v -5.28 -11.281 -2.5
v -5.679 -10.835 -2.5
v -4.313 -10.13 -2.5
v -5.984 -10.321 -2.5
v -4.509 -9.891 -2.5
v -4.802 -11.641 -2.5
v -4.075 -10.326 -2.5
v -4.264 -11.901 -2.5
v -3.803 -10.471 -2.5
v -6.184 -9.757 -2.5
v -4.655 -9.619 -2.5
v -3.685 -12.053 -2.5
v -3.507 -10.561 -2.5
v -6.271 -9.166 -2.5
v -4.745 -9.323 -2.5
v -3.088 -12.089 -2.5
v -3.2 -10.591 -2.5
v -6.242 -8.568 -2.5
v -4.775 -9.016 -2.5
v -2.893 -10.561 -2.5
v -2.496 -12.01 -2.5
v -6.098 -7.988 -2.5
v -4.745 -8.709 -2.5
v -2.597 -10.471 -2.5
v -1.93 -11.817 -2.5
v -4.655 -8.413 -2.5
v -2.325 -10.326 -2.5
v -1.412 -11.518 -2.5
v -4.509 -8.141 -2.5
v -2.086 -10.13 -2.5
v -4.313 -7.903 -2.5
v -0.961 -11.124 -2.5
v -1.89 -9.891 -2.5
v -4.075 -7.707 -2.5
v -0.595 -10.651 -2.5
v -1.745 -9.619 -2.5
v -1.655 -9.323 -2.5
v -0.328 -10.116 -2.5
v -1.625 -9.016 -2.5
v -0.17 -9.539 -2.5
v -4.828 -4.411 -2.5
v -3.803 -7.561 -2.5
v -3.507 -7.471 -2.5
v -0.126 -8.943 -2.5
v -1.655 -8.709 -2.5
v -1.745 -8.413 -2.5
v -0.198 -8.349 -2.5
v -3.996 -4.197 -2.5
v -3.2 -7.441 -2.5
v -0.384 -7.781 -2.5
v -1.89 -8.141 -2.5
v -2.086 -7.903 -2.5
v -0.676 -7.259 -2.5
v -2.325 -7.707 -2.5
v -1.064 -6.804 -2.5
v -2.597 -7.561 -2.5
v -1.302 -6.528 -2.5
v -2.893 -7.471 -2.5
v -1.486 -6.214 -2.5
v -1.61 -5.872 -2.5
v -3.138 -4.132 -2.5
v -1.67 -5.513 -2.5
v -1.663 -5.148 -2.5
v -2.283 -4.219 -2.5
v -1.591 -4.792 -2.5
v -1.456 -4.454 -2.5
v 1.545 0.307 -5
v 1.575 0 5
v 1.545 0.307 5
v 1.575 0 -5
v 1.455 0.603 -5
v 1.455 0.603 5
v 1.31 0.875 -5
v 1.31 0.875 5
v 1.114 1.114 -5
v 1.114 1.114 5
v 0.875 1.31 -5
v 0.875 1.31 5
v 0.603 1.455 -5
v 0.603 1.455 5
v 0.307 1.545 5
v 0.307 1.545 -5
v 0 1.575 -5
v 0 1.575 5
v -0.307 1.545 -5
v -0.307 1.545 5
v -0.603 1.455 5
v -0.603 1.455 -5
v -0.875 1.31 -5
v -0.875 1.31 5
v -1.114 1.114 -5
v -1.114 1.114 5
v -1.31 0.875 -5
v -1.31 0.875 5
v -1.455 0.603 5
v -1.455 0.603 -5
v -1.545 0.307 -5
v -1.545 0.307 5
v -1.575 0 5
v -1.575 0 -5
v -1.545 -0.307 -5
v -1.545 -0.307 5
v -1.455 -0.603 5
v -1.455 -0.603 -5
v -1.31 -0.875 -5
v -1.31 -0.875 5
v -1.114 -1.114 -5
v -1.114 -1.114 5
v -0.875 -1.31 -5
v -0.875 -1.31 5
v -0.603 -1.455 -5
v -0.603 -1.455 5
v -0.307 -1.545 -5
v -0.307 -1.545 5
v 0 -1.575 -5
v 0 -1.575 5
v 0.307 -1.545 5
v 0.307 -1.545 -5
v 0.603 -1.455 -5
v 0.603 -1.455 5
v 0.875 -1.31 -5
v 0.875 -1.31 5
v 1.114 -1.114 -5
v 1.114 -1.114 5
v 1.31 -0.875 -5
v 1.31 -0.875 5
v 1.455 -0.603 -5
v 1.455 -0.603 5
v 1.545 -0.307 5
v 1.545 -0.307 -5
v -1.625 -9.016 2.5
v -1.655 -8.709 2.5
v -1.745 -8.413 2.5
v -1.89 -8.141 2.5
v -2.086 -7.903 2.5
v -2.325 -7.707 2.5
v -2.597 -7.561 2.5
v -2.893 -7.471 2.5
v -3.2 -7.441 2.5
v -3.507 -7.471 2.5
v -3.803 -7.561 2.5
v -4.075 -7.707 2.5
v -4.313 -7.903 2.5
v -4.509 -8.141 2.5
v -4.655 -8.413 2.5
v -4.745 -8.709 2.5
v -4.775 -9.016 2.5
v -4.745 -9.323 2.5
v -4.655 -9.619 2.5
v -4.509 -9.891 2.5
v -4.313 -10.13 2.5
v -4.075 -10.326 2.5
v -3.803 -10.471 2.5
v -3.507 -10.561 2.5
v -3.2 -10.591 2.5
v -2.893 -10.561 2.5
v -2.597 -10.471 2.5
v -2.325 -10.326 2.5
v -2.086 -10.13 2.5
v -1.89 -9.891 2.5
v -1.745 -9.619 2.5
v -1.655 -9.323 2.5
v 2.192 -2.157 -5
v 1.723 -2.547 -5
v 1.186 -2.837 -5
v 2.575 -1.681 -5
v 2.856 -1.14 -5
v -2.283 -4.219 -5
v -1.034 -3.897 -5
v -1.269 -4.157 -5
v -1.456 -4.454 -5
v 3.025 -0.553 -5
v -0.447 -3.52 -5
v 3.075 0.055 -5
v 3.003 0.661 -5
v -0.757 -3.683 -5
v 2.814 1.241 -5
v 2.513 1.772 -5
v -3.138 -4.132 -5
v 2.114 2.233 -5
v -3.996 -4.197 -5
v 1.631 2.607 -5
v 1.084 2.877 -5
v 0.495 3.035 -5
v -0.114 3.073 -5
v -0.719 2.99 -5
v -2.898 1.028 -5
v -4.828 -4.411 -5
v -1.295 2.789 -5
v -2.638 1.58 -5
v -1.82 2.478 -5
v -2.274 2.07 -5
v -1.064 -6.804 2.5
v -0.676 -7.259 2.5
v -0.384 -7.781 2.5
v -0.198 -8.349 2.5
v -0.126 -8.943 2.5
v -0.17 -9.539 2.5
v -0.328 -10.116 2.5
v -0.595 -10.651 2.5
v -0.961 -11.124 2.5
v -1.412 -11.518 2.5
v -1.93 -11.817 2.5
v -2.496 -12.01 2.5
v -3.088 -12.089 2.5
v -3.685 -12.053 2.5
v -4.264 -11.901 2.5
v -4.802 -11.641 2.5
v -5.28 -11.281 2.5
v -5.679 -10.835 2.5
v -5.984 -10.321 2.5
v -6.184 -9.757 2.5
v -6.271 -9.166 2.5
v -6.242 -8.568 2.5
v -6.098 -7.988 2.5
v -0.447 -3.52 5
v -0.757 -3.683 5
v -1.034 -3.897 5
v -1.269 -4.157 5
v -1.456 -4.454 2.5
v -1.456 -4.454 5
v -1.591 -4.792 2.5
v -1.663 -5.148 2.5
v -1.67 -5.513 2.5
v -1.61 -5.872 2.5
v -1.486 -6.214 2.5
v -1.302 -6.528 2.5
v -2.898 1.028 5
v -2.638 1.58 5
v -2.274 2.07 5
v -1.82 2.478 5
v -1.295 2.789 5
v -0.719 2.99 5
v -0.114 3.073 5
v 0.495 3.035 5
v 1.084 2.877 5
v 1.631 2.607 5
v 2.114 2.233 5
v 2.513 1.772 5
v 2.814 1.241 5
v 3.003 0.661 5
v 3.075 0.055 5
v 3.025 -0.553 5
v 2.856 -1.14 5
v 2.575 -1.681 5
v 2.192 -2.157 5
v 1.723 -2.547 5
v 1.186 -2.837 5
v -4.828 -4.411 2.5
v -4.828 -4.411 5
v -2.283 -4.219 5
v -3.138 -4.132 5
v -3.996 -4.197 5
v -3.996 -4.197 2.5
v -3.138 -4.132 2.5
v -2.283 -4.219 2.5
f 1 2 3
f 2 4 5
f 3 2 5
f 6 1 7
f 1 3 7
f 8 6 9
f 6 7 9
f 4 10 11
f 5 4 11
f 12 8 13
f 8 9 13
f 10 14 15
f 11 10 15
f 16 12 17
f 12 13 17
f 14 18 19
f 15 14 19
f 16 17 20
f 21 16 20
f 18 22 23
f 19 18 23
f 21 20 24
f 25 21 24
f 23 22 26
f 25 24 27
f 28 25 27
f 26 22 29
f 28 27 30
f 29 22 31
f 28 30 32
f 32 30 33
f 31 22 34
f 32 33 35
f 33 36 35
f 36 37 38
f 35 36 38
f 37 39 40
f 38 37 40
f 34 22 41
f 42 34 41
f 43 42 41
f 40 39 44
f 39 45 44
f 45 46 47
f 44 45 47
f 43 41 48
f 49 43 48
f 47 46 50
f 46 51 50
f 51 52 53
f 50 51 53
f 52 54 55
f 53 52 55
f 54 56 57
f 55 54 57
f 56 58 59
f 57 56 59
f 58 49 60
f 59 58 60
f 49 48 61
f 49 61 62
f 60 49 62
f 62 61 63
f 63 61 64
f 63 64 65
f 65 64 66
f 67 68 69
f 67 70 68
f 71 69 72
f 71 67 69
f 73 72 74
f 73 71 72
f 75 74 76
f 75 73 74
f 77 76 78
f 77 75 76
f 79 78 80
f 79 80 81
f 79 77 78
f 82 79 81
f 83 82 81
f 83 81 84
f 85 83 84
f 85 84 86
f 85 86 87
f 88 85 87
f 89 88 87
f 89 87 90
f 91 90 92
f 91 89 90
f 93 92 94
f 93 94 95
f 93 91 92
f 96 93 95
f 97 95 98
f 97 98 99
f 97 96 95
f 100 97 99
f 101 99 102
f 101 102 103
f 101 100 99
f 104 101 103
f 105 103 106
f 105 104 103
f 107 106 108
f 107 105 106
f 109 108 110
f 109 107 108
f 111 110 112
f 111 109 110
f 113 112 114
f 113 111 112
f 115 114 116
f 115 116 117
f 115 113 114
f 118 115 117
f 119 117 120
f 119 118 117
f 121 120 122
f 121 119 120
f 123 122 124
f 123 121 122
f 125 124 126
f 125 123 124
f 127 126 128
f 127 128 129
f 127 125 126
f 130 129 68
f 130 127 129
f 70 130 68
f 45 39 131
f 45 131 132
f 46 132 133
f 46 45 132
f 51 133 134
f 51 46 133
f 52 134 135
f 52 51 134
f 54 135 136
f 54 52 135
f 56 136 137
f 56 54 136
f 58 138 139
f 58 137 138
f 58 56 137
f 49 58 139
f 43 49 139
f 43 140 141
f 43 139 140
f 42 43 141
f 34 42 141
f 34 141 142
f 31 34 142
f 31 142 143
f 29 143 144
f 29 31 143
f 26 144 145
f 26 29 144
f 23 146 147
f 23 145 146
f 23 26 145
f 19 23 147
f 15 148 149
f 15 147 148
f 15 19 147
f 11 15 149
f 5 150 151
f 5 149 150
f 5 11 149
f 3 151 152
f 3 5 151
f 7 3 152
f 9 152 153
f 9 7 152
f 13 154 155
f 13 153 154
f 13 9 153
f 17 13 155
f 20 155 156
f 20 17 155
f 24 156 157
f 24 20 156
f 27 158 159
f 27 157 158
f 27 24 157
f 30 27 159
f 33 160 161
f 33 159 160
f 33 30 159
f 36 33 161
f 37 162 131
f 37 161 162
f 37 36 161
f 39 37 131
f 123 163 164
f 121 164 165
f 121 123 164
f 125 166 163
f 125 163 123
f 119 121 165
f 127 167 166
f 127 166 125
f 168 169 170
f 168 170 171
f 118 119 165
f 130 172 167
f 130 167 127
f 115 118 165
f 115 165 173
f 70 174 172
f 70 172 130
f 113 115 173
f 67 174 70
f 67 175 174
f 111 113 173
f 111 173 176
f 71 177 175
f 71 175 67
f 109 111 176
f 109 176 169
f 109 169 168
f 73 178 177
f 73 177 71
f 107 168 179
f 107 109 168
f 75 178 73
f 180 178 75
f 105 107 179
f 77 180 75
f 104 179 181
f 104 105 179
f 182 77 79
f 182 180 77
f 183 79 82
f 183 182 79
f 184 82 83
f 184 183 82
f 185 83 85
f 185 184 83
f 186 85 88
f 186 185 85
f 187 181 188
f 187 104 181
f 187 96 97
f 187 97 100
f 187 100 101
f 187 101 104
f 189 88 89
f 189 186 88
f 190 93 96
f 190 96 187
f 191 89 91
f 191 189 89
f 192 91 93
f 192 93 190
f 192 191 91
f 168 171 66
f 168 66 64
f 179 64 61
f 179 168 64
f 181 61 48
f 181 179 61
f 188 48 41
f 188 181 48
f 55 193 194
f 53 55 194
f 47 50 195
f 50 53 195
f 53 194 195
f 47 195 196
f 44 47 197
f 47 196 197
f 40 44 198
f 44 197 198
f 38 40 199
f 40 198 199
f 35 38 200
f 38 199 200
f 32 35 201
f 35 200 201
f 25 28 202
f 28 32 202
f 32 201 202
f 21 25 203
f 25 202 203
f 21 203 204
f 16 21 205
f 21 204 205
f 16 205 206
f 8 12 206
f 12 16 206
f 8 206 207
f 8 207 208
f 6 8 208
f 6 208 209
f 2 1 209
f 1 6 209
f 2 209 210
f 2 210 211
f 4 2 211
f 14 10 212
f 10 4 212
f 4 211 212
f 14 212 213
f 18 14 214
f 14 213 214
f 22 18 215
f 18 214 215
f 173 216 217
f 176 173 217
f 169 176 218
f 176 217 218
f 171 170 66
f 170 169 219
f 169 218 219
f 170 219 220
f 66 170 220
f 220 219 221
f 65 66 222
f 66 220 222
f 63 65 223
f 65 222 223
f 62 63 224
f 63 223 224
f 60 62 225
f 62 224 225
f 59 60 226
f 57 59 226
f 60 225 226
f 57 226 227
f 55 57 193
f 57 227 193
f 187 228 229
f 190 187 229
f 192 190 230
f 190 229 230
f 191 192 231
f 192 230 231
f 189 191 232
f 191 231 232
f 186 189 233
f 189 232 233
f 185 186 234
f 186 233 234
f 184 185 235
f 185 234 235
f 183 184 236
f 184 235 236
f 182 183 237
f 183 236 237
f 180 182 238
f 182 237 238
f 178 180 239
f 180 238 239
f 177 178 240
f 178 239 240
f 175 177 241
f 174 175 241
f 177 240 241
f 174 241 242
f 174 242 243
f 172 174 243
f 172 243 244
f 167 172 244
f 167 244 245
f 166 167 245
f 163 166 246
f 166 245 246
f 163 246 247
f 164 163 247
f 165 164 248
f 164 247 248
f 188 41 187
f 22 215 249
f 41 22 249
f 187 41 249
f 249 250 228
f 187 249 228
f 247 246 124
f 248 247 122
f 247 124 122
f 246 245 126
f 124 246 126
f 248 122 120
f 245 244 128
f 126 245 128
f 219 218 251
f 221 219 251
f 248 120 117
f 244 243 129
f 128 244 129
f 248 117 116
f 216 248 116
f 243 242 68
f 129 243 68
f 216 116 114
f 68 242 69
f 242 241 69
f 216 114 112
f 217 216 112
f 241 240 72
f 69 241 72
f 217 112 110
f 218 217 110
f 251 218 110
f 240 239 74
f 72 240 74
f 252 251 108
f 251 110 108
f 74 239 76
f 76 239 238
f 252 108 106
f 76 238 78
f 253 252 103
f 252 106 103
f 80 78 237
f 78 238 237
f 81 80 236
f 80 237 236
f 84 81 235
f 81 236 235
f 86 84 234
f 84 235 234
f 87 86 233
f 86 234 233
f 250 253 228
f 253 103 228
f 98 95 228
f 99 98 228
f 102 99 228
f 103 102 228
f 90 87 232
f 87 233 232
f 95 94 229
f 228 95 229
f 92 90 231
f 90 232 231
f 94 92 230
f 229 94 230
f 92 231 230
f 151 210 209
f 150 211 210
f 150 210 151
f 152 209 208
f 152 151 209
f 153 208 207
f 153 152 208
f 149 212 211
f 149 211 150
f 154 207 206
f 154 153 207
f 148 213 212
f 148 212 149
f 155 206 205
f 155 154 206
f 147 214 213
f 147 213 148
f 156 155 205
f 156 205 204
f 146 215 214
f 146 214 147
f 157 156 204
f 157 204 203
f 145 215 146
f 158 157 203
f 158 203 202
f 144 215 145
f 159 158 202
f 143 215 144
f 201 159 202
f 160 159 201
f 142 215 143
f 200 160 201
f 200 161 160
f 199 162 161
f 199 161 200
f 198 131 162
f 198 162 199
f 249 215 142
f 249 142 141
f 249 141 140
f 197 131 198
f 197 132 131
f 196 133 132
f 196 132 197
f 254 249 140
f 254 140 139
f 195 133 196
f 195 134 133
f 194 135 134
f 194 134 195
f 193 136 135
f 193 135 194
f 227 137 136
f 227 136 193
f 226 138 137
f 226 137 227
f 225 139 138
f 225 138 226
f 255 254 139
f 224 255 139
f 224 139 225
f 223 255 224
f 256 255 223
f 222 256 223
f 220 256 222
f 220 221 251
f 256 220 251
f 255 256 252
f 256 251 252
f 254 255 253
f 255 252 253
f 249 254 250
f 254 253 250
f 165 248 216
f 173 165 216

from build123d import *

# Parameters (mm, degrees)
SKETCH1_R           = 1.575
BOSS_EXTRUDE1_DEPTH = 5
SKETCH2_R           = 4.88448764
CUT_EXTRUDE1_DEPTH  = 2.5


with BuildPart() as part:
    # Sketch1 → Boss-Extrude1 (new, symmetric)
    with BuildSketch(Plane.XY):
        with BuildLine():
            Line((1.186113957, -2.83703343), (-0.446593535, -3.519639818))
            ThreePointArc((-0.446593535, -3.519639818), (-1.640687739, -4.995254909), (-1.064164547, -6.803823921))
            ThreePointArc((-1.064164547, -6.803823921), (-2.49573113, -12.009536189), (-6.097709737, -7.987773738))
            Line((-6.097709737, -7.987773738), (-2.8979158, 1.028449811))
            ThreePointArc((-2.8979158, 1.028449811), (2.113777793, 2.233286466), (1.186113957, -2.83703343))
        make_face()
        Circle(SKETCH1_R, mode=Mode.SUBTRACT)
        with Locations((-3.199793936, -9.016223549)):
            Circle(SKETCH1_R, mode=Mode.SUBTRACT)
    extrude(amount=BOSS_EXTRUDE1_DEPTH, both=True)

    # Sketch2 → Cut-Extrude1 (cut)
    with BuildSketch(Plane.XY.offset(5)):
        with Locations((-3.199793936, -9.016223549)):
            Circle(SKETCH2_R)
    cut_extrude1 = extrude(amount=-CUT_EXTRUDE1_DEPTH, mode=Mode.SUBTRACT)

    # Mirror1: Cut-Extrude1 across plane
    add(cut_extrude1.mirror(Plane.XY), mode=Mode.SUBTRACT)


solid = part.part
